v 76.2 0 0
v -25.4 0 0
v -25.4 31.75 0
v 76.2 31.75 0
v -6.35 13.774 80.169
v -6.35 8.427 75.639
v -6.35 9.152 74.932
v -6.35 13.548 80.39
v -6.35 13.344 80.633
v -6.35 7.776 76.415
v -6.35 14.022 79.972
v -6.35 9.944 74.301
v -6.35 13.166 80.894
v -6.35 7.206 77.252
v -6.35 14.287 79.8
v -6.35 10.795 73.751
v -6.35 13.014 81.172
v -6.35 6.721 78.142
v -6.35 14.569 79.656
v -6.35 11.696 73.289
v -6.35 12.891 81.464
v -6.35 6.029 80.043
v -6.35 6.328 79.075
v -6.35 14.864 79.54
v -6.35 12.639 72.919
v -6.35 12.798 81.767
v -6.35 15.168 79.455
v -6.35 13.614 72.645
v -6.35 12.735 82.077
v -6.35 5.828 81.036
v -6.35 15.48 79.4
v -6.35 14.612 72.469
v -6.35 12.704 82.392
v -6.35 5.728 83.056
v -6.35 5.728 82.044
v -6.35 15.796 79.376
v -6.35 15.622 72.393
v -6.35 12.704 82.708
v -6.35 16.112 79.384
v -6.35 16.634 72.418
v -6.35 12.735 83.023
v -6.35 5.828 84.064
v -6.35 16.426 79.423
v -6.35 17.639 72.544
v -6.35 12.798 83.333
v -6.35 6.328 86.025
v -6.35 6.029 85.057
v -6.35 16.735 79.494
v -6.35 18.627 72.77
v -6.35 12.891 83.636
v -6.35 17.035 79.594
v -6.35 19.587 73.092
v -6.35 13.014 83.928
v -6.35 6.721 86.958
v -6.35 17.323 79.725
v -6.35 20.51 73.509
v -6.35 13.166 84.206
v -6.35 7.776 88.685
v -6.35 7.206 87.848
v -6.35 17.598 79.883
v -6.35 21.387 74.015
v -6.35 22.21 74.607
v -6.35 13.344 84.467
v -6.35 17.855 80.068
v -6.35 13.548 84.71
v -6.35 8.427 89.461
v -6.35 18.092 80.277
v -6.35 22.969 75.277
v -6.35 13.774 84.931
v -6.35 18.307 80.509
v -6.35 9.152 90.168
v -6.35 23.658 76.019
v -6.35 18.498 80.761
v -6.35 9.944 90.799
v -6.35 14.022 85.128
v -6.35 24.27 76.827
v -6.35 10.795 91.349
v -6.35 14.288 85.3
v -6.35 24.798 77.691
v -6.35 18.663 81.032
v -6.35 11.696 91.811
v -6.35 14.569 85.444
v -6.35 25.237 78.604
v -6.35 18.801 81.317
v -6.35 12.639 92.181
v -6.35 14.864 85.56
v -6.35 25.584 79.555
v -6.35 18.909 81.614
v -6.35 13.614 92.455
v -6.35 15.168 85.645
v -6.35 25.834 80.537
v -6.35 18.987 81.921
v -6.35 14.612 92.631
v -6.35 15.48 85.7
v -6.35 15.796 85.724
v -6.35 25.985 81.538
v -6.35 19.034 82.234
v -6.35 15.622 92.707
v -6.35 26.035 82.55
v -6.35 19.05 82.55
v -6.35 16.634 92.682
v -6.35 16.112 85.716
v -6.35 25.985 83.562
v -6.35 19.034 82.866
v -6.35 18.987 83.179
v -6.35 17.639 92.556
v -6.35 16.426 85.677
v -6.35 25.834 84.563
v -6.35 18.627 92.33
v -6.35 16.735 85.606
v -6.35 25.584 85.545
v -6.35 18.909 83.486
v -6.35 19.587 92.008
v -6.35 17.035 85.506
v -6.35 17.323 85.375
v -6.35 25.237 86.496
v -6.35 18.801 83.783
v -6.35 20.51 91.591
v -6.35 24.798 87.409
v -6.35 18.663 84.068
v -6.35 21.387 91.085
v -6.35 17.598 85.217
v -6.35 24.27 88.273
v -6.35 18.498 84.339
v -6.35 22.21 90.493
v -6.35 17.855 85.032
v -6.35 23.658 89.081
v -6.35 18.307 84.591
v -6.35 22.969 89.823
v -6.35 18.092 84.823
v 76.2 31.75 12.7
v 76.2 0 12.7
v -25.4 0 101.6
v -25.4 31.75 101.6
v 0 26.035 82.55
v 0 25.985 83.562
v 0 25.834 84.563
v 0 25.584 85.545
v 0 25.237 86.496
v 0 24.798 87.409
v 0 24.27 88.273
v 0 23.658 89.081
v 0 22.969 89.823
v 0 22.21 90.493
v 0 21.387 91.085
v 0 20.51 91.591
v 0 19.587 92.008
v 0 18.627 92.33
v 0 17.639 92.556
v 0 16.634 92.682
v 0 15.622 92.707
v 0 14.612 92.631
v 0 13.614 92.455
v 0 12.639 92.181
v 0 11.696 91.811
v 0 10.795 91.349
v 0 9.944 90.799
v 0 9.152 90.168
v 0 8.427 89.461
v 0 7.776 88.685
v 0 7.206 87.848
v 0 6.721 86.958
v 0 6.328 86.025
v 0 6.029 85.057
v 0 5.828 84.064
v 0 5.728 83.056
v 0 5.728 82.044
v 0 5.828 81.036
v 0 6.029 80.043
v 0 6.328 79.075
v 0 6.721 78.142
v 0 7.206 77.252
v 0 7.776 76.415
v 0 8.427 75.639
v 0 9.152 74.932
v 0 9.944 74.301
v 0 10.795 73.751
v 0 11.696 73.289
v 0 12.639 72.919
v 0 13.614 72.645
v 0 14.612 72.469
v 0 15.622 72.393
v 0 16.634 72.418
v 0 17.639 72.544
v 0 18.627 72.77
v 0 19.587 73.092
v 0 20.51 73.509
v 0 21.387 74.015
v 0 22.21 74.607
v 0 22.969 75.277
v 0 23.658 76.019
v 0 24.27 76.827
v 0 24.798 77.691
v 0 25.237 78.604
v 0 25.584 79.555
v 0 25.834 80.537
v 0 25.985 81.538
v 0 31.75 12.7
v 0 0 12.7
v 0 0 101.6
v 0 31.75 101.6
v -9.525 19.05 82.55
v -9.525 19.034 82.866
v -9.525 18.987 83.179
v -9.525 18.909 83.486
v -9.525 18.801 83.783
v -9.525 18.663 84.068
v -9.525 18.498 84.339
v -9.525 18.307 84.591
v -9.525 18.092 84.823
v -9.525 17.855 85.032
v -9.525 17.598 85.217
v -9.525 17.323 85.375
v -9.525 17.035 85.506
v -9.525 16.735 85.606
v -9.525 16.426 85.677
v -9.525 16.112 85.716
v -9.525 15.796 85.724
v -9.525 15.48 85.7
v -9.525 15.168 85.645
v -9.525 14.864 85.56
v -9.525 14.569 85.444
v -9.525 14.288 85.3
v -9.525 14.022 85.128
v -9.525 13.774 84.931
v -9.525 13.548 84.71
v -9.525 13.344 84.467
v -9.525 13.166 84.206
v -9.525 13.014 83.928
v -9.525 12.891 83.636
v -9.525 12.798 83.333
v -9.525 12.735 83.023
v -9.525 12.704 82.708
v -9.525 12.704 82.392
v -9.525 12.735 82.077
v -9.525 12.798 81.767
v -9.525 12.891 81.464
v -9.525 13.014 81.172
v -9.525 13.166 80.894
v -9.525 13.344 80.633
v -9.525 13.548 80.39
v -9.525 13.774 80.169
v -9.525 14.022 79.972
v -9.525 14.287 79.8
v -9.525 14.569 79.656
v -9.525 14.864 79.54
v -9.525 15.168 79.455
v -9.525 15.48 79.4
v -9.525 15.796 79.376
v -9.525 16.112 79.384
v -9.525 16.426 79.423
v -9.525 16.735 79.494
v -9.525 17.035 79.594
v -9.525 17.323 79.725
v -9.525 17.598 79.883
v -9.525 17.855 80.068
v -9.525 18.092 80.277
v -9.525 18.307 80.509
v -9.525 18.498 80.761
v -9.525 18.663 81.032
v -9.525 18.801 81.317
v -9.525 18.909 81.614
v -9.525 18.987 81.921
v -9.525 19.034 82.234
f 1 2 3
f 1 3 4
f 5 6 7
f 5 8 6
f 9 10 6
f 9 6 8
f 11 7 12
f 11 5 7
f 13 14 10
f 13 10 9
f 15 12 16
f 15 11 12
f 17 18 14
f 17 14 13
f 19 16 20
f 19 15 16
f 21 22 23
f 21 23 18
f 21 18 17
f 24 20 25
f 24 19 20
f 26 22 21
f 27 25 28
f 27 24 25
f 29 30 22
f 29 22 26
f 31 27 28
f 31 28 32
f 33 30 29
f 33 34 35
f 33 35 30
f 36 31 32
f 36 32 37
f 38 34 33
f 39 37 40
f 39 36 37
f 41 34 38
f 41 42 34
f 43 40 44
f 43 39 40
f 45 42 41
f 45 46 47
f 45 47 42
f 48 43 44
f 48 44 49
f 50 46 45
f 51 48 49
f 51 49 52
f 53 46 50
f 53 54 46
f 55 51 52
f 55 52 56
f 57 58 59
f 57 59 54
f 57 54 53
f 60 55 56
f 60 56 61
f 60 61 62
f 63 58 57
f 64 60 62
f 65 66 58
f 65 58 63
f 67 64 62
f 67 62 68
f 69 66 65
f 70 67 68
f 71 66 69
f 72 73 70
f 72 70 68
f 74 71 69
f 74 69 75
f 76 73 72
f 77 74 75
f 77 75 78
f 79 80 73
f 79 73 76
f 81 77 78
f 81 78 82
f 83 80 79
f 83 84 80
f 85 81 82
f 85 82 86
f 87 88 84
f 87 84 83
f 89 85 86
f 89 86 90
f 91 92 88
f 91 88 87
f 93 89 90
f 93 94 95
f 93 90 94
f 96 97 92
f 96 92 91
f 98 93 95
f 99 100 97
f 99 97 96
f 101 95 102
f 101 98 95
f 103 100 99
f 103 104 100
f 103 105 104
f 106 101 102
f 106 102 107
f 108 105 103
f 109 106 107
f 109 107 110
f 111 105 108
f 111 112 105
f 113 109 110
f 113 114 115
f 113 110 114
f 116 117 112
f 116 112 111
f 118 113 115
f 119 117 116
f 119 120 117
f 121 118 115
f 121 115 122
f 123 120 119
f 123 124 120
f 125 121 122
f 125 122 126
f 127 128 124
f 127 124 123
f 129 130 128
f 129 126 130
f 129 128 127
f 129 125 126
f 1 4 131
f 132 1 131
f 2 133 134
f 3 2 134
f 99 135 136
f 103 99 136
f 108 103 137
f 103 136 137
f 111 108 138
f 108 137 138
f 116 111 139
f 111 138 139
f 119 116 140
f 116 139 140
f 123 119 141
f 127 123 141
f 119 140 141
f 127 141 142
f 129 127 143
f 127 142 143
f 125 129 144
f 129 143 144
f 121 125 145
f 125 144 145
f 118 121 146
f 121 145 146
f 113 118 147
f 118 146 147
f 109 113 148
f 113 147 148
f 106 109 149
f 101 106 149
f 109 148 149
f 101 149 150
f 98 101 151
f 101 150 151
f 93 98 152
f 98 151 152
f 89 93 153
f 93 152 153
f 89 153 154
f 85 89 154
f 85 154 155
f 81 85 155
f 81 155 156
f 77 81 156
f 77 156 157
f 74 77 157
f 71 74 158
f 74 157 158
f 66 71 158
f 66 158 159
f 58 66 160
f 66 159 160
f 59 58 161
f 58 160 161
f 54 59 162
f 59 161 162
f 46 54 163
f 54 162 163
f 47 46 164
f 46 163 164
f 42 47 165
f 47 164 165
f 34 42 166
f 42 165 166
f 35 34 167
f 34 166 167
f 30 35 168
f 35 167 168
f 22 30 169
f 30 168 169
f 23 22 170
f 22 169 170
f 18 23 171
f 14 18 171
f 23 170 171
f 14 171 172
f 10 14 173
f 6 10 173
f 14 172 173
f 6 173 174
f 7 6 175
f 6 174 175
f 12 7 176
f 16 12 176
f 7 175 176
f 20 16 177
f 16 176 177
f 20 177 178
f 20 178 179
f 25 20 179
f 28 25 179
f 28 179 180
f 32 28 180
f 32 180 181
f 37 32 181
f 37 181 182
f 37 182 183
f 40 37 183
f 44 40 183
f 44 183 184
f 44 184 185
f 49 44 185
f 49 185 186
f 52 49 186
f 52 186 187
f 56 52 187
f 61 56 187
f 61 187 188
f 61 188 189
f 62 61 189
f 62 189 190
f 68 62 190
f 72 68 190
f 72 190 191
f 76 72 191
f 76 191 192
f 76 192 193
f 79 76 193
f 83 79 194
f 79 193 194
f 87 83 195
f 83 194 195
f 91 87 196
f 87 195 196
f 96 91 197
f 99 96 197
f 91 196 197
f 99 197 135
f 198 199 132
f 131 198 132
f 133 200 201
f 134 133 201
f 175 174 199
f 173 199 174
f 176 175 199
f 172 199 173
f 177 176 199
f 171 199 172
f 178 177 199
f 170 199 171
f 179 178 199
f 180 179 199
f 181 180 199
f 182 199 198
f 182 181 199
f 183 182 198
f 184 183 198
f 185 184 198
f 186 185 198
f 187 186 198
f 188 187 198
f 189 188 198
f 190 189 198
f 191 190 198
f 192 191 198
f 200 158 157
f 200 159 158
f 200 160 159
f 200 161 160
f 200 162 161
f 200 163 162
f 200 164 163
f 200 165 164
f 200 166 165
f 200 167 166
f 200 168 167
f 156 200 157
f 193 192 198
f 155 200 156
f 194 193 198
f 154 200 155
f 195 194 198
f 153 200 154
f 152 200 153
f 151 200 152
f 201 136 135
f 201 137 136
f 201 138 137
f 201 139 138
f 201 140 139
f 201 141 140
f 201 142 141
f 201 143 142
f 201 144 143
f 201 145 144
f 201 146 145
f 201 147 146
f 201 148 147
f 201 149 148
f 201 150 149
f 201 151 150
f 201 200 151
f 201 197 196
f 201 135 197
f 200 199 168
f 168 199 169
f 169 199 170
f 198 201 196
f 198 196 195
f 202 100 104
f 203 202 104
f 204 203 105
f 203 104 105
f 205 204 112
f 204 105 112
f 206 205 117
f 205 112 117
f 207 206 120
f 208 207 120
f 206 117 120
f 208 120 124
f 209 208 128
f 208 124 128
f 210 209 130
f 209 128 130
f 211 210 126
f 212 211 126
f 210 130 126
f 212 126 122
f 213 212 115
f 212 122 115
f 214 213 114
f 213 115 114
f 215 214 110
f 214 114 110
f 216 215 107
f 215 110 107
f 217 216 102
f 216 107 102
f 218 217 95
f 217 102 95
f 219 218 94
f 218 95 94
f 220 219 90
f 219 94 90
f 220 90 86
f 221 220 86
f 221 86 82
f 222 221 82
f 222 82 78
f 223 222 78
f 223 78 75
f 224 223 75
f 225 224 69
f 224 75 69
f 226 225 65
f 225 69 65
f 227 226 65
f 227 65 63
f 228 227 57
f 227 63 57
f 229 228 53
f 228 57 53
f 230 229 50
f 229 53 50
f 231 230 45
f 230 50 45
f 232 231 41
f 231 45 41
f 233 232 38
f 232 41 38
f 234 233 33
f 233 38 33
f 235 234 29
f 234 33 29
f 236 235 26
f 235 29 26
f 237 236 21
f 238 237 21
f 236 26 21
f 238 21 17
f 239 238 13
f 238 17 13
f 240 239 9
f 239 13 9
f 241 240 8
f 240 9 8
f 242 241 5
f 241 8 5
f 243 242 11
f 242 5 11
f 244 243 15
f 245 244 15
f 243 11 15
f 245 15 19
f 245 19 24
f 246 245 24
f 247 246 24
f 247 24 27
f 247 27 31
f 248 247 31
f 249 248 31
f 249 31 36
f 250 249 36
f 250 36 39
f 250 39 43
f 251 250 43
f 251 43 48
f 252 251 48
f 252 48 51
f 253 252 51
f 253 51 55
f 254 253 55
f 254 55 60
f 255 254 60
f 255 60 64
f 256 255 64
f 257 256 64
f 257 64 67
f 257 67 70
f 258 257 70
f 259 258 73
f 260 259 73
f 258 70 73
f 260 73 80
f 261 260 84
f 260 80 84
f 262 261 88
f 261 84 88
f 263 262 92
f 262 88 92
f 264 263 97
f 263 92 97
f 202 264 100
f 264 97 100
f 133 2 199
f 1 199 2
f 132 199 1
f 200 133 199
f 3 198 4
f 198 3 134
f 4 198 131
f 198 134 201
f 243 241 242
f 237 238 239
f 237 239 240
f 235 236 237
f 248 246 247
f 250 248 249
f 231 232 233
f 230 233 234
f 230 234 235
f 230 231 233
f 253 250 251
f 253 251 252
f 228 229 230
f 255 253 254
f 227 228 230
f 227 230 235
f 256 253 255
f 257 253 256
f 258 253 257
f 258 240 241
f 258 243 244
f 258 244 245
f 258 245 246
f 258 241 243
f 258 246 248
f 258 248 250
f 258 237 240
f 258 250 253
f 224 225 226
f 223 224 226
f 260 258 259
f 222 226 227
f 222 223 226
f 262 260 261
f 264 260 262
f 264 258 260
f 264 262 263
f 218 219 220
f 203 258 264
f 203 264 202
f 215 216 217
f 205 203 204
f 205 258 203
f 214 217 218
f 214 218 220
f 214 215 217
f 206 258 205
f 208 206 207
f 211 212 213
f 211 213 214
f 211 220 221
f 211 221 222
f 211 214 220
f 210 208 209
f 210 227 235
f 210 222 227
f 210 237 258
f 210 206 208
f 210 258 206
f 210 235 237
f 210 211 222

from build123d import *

# Parameters (mm, degrees)
F0_W     = 31.75
F0_H     = 101.6
F1_DEPTH = 25.4
F2_R     = 10.16
F3_DEPTH = 6.35
F4_R     = 3.175
F5_DEPTH = 3.175
F6_W     = 76.2
F6_H     = 12.7
F7_DEPTH = 31.75


with BuildPart() as f1:
    # F0 (on Right) → F1 (new body)
    with BuildSketch(Plane.YZ):
        with Locations((15.875, 50.8)):
            Rectangle(F0_W, F0_H)
    extrude(amount=-F1_DEPTH)

    # F2 (on face) → F3 (cut)
    with BuildSketch(Plane.YZ):
        with Locations((15.875, 82.55)):
            Circle(F2_R)
    extrude(amount=-F3_DEPTH, mode=Mode.SUBTRACT)

    # F4 (on face) → F5 (cut)
    with BuildSketch(Plane.YZ.offset(-6.35)):
        with Locations((15.875, 82.55)):
            Circle(F4_R)
    extrude(amount=-F5_DEPTH, mode=Mode.SUBTRACT)

    # F6 (on face) → F7 (join)
    with BuildSketch(Plane.XZ):
        with Locations((38.1, 6.35)):
            Rectangle(F6_W, F6_H)
    extrude(amount=-F7_DEPTH)


solid = f1.part
